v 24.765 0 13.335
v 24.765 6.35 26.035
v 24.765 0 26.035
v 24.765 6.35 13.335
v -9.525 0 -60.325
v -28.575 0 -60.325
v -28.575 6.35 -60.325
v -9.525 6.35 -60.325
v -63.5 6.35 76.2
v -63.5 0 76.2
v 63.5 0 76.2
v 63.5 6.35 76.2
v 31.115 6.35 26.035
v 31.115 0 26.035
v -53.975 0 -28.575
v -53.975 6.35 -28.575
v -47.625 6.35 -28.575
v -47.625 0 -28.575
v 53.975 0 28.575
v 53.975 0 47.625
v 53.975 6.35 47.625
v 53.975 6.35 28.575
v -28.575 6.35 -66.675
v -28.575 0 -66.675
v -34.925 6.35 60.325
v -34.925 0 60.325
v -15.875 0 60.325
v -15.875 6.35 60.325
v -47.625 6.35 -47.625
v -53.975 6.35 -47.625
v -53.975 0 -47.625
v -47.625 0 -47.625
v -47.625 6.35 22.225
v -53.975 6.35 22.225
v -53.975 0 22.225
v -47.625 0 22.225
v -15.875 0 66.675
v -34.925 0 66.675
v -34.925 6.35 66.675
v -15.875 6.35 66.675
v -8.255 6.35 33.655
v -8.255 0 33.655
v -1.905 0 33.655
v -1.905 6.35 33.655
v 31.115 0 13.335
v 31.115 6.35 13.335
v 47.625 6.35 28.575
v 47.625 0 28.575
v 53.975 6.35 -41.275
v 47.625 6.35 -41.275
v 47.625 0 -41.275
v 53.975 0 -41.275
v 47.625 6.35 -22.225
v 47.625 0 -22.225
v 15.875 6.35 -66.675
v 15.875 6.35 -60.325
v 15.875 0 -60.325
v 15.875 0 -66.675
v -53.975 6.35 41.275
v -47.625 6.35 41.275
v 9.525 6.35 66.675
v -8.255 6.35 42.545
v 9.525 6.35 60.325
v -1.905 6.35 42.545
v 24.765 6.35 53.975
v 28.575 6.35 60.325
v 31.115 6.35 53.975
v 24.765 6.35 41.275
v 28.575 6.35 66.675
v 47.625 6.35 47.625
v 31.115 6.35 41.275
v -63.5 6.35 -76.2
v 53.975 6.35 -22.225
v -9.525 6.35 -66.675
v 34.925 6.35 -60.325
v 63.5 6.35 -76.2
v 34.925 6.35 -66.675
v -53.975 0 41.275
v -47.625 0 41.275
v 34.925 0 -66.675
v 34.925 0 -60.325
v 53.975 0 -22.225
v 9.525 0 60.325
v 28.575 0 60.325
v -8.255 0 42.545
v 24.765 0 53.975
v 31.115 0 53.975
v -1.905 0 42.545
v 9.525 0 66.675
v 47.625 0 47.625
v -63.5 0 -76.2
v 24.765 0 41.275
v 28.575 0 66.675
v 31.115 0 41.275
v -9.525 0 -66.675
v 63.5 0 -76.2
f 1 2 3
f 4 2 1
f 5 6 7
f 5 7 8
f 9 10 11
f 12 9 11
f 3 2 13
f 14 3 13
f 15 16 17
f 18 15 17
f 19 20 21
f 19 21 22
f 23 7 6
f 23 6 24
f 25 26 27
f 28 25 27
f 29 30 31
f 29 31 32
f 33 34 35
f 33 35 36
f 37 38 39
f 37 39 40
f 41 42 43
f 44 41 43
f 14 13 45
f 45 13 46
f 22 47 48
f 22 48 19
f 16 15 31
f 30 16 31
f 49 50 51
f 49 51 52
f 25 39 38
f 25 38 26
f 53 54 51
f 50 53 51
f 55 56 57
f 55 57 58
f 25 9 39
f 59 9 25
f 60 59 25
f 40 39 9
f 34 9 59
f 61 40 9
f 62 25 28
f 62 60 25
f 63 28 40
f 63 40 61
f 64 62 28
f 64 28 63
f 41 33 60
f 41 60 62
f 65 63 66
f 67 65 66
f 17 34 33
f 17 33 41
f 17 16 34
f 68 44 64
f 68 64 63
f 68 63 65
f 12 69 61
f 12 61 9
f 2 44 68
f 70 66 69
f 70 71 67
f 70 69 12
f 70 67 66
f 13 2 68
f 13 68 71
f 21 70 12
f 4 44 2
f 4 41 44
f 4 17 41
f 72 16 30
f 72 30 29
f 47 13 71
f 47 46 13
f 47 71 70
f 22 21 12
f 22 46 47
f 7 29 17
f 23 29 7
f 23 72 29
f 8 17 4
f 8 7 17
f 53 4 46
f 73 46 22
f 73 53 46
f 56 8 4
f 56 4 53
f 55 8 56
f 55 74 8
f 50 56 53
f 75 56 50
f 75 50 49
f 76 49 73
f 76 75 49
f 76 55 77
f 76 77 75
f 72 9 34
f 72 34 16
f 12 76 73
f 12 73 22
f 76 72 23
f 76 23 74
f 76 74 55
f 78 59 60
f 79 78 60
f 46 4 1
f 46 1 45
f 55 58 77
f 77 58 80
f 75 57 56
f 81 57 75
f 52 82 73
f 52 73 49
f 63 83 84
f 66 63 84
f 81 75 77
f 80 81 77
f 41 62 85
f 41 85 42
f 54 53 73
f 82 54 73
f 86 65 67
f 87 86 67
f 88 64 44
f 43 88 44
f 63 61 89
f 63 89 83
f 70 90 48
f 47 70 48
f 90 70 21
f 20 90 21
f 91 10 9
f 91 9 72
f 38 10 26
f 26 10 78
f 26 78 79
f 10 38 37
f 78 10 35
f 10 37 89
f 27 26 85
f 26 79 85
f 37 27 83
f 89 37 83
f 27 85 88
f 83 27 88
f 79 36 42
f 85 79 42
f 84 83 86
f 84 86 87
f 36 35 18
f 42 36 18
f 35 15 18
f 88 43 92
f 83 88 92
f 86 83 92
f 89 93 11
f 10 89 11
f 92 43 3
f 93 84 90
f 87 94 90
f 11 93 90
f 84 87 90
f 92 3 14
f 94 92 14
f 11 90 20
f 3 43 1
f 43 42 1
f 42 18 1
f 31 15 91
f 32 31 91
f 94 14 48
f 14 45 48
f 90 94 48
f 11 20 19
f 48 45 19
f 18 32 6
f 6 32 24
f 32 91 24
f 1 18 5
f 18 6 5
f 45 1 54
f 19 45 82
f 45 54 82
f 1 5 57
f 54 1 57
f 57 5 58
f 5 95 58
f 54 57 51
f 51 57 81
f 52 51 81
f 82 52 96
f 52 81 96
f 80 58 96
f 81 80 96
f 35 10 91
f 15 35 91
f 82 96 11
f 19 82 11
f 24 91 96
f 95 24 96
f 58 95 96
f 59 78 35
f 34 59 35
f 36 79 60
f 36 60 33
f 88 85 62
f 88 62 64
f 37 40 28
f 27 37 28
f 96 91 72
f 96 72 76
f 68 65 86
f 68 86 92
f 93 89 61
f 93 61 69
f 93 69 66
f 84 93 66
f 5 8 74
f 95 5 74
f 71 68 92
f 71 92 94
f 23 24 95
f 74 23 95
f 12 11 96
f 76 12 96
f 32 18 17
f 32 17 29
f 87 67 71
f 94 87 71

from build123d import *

# Parameters (mm, degrees)
SKETCH1_W         = 127
SKETCH1_H         = 152.4
SKETCH1_W_2       = 19.05
SKETCH1_H_2       = 6.35
SKETCH1_W_3       = 6.35
SKETCH1_H_3       = 19.05
BASE_DEPTH        = 6.35
SKETCH2_W         = 6.35
SKETCH2_H         = 12.7
SKETCH2_H_2       = 8.89
MOTORMOUNTS_DEPTH = 100.3932216


with BuildPart() as part:
    # Sketch1 → BASE (new body)
    with BuildSketch(Plane(origin=(0, 0, 0), x_dir=(1, 0, 0), z_dir=(0, 1, 0))):
        Rectangle(SKETCH1_W, SKETCH1_H)
        with Locations((-19.05, 63.5)):
            Rectangle(SKETCH1_W_2, SKETCH1_H_2, mode=Mode.SUBTRACT)
        with Locations((25.4, 63.5)):
            Rectangle(SKETCH1_W_2, SKETCH1_H_2, mode=Mode.SUBTRACT)
        with Locations((-50.8, 38.1)):
            Rectangle(SKETCH1_W_3, SKETCH1_H_3, mode=Mode.SUBTRACT)
        with Locations((-50.8, -31.75)):
            Rectangle(SKETCH1_W_3, SKETCH1_H_3, mode=Mode.SUBTRACT)
        with Locations((-25.4, -63.5)):
            Rectangle(SKETCH1_W_2, SKETCH1_H_2, mode=Mode.SUBTRACT)
        with Locations((19.05, -63.5)):
            Rectangle(SKETCH1_W_2, SKETCH1_H_2, mode=Mode.SUBTRACT)
        with Locations((50.8, -38.1)):
            Rectangle(SKETCH1_W_3, SKETCH1_H_3, mode=Mode.SUBTRACT)
        with Locations((50.8, 31.75)):
            Rectangle(SKETCH1_W_3, SKETCH1_H_3, mode=Mode.SUBTRACT)
    extrude(amount=BASE_DEPTH)

    # Sketch2 → MOTORMOUNTS (cut, through all)
    with BuildSketch(Plane(origin=(0, 6.35, 0), x_dir=(1, 0, 0), z_dir=(0, 1, 0))):
        with Locations((27.94, -19.685)):
            Rectangle(SKETCH2_W, SKETCH2_H)
        with Locations((27.94, -47.625)):
            Rectangle(SKETCH2_W, SKETCH2_H)
        with Locations((-5.08, -38.1)):
            Rectangle(SKETCH2_W, SKETCH2_H_2)
    extrude(amount=-MOTORMOUNTS_DEPTH, mode=Mode.SUBTRACT)


solid = part.part
